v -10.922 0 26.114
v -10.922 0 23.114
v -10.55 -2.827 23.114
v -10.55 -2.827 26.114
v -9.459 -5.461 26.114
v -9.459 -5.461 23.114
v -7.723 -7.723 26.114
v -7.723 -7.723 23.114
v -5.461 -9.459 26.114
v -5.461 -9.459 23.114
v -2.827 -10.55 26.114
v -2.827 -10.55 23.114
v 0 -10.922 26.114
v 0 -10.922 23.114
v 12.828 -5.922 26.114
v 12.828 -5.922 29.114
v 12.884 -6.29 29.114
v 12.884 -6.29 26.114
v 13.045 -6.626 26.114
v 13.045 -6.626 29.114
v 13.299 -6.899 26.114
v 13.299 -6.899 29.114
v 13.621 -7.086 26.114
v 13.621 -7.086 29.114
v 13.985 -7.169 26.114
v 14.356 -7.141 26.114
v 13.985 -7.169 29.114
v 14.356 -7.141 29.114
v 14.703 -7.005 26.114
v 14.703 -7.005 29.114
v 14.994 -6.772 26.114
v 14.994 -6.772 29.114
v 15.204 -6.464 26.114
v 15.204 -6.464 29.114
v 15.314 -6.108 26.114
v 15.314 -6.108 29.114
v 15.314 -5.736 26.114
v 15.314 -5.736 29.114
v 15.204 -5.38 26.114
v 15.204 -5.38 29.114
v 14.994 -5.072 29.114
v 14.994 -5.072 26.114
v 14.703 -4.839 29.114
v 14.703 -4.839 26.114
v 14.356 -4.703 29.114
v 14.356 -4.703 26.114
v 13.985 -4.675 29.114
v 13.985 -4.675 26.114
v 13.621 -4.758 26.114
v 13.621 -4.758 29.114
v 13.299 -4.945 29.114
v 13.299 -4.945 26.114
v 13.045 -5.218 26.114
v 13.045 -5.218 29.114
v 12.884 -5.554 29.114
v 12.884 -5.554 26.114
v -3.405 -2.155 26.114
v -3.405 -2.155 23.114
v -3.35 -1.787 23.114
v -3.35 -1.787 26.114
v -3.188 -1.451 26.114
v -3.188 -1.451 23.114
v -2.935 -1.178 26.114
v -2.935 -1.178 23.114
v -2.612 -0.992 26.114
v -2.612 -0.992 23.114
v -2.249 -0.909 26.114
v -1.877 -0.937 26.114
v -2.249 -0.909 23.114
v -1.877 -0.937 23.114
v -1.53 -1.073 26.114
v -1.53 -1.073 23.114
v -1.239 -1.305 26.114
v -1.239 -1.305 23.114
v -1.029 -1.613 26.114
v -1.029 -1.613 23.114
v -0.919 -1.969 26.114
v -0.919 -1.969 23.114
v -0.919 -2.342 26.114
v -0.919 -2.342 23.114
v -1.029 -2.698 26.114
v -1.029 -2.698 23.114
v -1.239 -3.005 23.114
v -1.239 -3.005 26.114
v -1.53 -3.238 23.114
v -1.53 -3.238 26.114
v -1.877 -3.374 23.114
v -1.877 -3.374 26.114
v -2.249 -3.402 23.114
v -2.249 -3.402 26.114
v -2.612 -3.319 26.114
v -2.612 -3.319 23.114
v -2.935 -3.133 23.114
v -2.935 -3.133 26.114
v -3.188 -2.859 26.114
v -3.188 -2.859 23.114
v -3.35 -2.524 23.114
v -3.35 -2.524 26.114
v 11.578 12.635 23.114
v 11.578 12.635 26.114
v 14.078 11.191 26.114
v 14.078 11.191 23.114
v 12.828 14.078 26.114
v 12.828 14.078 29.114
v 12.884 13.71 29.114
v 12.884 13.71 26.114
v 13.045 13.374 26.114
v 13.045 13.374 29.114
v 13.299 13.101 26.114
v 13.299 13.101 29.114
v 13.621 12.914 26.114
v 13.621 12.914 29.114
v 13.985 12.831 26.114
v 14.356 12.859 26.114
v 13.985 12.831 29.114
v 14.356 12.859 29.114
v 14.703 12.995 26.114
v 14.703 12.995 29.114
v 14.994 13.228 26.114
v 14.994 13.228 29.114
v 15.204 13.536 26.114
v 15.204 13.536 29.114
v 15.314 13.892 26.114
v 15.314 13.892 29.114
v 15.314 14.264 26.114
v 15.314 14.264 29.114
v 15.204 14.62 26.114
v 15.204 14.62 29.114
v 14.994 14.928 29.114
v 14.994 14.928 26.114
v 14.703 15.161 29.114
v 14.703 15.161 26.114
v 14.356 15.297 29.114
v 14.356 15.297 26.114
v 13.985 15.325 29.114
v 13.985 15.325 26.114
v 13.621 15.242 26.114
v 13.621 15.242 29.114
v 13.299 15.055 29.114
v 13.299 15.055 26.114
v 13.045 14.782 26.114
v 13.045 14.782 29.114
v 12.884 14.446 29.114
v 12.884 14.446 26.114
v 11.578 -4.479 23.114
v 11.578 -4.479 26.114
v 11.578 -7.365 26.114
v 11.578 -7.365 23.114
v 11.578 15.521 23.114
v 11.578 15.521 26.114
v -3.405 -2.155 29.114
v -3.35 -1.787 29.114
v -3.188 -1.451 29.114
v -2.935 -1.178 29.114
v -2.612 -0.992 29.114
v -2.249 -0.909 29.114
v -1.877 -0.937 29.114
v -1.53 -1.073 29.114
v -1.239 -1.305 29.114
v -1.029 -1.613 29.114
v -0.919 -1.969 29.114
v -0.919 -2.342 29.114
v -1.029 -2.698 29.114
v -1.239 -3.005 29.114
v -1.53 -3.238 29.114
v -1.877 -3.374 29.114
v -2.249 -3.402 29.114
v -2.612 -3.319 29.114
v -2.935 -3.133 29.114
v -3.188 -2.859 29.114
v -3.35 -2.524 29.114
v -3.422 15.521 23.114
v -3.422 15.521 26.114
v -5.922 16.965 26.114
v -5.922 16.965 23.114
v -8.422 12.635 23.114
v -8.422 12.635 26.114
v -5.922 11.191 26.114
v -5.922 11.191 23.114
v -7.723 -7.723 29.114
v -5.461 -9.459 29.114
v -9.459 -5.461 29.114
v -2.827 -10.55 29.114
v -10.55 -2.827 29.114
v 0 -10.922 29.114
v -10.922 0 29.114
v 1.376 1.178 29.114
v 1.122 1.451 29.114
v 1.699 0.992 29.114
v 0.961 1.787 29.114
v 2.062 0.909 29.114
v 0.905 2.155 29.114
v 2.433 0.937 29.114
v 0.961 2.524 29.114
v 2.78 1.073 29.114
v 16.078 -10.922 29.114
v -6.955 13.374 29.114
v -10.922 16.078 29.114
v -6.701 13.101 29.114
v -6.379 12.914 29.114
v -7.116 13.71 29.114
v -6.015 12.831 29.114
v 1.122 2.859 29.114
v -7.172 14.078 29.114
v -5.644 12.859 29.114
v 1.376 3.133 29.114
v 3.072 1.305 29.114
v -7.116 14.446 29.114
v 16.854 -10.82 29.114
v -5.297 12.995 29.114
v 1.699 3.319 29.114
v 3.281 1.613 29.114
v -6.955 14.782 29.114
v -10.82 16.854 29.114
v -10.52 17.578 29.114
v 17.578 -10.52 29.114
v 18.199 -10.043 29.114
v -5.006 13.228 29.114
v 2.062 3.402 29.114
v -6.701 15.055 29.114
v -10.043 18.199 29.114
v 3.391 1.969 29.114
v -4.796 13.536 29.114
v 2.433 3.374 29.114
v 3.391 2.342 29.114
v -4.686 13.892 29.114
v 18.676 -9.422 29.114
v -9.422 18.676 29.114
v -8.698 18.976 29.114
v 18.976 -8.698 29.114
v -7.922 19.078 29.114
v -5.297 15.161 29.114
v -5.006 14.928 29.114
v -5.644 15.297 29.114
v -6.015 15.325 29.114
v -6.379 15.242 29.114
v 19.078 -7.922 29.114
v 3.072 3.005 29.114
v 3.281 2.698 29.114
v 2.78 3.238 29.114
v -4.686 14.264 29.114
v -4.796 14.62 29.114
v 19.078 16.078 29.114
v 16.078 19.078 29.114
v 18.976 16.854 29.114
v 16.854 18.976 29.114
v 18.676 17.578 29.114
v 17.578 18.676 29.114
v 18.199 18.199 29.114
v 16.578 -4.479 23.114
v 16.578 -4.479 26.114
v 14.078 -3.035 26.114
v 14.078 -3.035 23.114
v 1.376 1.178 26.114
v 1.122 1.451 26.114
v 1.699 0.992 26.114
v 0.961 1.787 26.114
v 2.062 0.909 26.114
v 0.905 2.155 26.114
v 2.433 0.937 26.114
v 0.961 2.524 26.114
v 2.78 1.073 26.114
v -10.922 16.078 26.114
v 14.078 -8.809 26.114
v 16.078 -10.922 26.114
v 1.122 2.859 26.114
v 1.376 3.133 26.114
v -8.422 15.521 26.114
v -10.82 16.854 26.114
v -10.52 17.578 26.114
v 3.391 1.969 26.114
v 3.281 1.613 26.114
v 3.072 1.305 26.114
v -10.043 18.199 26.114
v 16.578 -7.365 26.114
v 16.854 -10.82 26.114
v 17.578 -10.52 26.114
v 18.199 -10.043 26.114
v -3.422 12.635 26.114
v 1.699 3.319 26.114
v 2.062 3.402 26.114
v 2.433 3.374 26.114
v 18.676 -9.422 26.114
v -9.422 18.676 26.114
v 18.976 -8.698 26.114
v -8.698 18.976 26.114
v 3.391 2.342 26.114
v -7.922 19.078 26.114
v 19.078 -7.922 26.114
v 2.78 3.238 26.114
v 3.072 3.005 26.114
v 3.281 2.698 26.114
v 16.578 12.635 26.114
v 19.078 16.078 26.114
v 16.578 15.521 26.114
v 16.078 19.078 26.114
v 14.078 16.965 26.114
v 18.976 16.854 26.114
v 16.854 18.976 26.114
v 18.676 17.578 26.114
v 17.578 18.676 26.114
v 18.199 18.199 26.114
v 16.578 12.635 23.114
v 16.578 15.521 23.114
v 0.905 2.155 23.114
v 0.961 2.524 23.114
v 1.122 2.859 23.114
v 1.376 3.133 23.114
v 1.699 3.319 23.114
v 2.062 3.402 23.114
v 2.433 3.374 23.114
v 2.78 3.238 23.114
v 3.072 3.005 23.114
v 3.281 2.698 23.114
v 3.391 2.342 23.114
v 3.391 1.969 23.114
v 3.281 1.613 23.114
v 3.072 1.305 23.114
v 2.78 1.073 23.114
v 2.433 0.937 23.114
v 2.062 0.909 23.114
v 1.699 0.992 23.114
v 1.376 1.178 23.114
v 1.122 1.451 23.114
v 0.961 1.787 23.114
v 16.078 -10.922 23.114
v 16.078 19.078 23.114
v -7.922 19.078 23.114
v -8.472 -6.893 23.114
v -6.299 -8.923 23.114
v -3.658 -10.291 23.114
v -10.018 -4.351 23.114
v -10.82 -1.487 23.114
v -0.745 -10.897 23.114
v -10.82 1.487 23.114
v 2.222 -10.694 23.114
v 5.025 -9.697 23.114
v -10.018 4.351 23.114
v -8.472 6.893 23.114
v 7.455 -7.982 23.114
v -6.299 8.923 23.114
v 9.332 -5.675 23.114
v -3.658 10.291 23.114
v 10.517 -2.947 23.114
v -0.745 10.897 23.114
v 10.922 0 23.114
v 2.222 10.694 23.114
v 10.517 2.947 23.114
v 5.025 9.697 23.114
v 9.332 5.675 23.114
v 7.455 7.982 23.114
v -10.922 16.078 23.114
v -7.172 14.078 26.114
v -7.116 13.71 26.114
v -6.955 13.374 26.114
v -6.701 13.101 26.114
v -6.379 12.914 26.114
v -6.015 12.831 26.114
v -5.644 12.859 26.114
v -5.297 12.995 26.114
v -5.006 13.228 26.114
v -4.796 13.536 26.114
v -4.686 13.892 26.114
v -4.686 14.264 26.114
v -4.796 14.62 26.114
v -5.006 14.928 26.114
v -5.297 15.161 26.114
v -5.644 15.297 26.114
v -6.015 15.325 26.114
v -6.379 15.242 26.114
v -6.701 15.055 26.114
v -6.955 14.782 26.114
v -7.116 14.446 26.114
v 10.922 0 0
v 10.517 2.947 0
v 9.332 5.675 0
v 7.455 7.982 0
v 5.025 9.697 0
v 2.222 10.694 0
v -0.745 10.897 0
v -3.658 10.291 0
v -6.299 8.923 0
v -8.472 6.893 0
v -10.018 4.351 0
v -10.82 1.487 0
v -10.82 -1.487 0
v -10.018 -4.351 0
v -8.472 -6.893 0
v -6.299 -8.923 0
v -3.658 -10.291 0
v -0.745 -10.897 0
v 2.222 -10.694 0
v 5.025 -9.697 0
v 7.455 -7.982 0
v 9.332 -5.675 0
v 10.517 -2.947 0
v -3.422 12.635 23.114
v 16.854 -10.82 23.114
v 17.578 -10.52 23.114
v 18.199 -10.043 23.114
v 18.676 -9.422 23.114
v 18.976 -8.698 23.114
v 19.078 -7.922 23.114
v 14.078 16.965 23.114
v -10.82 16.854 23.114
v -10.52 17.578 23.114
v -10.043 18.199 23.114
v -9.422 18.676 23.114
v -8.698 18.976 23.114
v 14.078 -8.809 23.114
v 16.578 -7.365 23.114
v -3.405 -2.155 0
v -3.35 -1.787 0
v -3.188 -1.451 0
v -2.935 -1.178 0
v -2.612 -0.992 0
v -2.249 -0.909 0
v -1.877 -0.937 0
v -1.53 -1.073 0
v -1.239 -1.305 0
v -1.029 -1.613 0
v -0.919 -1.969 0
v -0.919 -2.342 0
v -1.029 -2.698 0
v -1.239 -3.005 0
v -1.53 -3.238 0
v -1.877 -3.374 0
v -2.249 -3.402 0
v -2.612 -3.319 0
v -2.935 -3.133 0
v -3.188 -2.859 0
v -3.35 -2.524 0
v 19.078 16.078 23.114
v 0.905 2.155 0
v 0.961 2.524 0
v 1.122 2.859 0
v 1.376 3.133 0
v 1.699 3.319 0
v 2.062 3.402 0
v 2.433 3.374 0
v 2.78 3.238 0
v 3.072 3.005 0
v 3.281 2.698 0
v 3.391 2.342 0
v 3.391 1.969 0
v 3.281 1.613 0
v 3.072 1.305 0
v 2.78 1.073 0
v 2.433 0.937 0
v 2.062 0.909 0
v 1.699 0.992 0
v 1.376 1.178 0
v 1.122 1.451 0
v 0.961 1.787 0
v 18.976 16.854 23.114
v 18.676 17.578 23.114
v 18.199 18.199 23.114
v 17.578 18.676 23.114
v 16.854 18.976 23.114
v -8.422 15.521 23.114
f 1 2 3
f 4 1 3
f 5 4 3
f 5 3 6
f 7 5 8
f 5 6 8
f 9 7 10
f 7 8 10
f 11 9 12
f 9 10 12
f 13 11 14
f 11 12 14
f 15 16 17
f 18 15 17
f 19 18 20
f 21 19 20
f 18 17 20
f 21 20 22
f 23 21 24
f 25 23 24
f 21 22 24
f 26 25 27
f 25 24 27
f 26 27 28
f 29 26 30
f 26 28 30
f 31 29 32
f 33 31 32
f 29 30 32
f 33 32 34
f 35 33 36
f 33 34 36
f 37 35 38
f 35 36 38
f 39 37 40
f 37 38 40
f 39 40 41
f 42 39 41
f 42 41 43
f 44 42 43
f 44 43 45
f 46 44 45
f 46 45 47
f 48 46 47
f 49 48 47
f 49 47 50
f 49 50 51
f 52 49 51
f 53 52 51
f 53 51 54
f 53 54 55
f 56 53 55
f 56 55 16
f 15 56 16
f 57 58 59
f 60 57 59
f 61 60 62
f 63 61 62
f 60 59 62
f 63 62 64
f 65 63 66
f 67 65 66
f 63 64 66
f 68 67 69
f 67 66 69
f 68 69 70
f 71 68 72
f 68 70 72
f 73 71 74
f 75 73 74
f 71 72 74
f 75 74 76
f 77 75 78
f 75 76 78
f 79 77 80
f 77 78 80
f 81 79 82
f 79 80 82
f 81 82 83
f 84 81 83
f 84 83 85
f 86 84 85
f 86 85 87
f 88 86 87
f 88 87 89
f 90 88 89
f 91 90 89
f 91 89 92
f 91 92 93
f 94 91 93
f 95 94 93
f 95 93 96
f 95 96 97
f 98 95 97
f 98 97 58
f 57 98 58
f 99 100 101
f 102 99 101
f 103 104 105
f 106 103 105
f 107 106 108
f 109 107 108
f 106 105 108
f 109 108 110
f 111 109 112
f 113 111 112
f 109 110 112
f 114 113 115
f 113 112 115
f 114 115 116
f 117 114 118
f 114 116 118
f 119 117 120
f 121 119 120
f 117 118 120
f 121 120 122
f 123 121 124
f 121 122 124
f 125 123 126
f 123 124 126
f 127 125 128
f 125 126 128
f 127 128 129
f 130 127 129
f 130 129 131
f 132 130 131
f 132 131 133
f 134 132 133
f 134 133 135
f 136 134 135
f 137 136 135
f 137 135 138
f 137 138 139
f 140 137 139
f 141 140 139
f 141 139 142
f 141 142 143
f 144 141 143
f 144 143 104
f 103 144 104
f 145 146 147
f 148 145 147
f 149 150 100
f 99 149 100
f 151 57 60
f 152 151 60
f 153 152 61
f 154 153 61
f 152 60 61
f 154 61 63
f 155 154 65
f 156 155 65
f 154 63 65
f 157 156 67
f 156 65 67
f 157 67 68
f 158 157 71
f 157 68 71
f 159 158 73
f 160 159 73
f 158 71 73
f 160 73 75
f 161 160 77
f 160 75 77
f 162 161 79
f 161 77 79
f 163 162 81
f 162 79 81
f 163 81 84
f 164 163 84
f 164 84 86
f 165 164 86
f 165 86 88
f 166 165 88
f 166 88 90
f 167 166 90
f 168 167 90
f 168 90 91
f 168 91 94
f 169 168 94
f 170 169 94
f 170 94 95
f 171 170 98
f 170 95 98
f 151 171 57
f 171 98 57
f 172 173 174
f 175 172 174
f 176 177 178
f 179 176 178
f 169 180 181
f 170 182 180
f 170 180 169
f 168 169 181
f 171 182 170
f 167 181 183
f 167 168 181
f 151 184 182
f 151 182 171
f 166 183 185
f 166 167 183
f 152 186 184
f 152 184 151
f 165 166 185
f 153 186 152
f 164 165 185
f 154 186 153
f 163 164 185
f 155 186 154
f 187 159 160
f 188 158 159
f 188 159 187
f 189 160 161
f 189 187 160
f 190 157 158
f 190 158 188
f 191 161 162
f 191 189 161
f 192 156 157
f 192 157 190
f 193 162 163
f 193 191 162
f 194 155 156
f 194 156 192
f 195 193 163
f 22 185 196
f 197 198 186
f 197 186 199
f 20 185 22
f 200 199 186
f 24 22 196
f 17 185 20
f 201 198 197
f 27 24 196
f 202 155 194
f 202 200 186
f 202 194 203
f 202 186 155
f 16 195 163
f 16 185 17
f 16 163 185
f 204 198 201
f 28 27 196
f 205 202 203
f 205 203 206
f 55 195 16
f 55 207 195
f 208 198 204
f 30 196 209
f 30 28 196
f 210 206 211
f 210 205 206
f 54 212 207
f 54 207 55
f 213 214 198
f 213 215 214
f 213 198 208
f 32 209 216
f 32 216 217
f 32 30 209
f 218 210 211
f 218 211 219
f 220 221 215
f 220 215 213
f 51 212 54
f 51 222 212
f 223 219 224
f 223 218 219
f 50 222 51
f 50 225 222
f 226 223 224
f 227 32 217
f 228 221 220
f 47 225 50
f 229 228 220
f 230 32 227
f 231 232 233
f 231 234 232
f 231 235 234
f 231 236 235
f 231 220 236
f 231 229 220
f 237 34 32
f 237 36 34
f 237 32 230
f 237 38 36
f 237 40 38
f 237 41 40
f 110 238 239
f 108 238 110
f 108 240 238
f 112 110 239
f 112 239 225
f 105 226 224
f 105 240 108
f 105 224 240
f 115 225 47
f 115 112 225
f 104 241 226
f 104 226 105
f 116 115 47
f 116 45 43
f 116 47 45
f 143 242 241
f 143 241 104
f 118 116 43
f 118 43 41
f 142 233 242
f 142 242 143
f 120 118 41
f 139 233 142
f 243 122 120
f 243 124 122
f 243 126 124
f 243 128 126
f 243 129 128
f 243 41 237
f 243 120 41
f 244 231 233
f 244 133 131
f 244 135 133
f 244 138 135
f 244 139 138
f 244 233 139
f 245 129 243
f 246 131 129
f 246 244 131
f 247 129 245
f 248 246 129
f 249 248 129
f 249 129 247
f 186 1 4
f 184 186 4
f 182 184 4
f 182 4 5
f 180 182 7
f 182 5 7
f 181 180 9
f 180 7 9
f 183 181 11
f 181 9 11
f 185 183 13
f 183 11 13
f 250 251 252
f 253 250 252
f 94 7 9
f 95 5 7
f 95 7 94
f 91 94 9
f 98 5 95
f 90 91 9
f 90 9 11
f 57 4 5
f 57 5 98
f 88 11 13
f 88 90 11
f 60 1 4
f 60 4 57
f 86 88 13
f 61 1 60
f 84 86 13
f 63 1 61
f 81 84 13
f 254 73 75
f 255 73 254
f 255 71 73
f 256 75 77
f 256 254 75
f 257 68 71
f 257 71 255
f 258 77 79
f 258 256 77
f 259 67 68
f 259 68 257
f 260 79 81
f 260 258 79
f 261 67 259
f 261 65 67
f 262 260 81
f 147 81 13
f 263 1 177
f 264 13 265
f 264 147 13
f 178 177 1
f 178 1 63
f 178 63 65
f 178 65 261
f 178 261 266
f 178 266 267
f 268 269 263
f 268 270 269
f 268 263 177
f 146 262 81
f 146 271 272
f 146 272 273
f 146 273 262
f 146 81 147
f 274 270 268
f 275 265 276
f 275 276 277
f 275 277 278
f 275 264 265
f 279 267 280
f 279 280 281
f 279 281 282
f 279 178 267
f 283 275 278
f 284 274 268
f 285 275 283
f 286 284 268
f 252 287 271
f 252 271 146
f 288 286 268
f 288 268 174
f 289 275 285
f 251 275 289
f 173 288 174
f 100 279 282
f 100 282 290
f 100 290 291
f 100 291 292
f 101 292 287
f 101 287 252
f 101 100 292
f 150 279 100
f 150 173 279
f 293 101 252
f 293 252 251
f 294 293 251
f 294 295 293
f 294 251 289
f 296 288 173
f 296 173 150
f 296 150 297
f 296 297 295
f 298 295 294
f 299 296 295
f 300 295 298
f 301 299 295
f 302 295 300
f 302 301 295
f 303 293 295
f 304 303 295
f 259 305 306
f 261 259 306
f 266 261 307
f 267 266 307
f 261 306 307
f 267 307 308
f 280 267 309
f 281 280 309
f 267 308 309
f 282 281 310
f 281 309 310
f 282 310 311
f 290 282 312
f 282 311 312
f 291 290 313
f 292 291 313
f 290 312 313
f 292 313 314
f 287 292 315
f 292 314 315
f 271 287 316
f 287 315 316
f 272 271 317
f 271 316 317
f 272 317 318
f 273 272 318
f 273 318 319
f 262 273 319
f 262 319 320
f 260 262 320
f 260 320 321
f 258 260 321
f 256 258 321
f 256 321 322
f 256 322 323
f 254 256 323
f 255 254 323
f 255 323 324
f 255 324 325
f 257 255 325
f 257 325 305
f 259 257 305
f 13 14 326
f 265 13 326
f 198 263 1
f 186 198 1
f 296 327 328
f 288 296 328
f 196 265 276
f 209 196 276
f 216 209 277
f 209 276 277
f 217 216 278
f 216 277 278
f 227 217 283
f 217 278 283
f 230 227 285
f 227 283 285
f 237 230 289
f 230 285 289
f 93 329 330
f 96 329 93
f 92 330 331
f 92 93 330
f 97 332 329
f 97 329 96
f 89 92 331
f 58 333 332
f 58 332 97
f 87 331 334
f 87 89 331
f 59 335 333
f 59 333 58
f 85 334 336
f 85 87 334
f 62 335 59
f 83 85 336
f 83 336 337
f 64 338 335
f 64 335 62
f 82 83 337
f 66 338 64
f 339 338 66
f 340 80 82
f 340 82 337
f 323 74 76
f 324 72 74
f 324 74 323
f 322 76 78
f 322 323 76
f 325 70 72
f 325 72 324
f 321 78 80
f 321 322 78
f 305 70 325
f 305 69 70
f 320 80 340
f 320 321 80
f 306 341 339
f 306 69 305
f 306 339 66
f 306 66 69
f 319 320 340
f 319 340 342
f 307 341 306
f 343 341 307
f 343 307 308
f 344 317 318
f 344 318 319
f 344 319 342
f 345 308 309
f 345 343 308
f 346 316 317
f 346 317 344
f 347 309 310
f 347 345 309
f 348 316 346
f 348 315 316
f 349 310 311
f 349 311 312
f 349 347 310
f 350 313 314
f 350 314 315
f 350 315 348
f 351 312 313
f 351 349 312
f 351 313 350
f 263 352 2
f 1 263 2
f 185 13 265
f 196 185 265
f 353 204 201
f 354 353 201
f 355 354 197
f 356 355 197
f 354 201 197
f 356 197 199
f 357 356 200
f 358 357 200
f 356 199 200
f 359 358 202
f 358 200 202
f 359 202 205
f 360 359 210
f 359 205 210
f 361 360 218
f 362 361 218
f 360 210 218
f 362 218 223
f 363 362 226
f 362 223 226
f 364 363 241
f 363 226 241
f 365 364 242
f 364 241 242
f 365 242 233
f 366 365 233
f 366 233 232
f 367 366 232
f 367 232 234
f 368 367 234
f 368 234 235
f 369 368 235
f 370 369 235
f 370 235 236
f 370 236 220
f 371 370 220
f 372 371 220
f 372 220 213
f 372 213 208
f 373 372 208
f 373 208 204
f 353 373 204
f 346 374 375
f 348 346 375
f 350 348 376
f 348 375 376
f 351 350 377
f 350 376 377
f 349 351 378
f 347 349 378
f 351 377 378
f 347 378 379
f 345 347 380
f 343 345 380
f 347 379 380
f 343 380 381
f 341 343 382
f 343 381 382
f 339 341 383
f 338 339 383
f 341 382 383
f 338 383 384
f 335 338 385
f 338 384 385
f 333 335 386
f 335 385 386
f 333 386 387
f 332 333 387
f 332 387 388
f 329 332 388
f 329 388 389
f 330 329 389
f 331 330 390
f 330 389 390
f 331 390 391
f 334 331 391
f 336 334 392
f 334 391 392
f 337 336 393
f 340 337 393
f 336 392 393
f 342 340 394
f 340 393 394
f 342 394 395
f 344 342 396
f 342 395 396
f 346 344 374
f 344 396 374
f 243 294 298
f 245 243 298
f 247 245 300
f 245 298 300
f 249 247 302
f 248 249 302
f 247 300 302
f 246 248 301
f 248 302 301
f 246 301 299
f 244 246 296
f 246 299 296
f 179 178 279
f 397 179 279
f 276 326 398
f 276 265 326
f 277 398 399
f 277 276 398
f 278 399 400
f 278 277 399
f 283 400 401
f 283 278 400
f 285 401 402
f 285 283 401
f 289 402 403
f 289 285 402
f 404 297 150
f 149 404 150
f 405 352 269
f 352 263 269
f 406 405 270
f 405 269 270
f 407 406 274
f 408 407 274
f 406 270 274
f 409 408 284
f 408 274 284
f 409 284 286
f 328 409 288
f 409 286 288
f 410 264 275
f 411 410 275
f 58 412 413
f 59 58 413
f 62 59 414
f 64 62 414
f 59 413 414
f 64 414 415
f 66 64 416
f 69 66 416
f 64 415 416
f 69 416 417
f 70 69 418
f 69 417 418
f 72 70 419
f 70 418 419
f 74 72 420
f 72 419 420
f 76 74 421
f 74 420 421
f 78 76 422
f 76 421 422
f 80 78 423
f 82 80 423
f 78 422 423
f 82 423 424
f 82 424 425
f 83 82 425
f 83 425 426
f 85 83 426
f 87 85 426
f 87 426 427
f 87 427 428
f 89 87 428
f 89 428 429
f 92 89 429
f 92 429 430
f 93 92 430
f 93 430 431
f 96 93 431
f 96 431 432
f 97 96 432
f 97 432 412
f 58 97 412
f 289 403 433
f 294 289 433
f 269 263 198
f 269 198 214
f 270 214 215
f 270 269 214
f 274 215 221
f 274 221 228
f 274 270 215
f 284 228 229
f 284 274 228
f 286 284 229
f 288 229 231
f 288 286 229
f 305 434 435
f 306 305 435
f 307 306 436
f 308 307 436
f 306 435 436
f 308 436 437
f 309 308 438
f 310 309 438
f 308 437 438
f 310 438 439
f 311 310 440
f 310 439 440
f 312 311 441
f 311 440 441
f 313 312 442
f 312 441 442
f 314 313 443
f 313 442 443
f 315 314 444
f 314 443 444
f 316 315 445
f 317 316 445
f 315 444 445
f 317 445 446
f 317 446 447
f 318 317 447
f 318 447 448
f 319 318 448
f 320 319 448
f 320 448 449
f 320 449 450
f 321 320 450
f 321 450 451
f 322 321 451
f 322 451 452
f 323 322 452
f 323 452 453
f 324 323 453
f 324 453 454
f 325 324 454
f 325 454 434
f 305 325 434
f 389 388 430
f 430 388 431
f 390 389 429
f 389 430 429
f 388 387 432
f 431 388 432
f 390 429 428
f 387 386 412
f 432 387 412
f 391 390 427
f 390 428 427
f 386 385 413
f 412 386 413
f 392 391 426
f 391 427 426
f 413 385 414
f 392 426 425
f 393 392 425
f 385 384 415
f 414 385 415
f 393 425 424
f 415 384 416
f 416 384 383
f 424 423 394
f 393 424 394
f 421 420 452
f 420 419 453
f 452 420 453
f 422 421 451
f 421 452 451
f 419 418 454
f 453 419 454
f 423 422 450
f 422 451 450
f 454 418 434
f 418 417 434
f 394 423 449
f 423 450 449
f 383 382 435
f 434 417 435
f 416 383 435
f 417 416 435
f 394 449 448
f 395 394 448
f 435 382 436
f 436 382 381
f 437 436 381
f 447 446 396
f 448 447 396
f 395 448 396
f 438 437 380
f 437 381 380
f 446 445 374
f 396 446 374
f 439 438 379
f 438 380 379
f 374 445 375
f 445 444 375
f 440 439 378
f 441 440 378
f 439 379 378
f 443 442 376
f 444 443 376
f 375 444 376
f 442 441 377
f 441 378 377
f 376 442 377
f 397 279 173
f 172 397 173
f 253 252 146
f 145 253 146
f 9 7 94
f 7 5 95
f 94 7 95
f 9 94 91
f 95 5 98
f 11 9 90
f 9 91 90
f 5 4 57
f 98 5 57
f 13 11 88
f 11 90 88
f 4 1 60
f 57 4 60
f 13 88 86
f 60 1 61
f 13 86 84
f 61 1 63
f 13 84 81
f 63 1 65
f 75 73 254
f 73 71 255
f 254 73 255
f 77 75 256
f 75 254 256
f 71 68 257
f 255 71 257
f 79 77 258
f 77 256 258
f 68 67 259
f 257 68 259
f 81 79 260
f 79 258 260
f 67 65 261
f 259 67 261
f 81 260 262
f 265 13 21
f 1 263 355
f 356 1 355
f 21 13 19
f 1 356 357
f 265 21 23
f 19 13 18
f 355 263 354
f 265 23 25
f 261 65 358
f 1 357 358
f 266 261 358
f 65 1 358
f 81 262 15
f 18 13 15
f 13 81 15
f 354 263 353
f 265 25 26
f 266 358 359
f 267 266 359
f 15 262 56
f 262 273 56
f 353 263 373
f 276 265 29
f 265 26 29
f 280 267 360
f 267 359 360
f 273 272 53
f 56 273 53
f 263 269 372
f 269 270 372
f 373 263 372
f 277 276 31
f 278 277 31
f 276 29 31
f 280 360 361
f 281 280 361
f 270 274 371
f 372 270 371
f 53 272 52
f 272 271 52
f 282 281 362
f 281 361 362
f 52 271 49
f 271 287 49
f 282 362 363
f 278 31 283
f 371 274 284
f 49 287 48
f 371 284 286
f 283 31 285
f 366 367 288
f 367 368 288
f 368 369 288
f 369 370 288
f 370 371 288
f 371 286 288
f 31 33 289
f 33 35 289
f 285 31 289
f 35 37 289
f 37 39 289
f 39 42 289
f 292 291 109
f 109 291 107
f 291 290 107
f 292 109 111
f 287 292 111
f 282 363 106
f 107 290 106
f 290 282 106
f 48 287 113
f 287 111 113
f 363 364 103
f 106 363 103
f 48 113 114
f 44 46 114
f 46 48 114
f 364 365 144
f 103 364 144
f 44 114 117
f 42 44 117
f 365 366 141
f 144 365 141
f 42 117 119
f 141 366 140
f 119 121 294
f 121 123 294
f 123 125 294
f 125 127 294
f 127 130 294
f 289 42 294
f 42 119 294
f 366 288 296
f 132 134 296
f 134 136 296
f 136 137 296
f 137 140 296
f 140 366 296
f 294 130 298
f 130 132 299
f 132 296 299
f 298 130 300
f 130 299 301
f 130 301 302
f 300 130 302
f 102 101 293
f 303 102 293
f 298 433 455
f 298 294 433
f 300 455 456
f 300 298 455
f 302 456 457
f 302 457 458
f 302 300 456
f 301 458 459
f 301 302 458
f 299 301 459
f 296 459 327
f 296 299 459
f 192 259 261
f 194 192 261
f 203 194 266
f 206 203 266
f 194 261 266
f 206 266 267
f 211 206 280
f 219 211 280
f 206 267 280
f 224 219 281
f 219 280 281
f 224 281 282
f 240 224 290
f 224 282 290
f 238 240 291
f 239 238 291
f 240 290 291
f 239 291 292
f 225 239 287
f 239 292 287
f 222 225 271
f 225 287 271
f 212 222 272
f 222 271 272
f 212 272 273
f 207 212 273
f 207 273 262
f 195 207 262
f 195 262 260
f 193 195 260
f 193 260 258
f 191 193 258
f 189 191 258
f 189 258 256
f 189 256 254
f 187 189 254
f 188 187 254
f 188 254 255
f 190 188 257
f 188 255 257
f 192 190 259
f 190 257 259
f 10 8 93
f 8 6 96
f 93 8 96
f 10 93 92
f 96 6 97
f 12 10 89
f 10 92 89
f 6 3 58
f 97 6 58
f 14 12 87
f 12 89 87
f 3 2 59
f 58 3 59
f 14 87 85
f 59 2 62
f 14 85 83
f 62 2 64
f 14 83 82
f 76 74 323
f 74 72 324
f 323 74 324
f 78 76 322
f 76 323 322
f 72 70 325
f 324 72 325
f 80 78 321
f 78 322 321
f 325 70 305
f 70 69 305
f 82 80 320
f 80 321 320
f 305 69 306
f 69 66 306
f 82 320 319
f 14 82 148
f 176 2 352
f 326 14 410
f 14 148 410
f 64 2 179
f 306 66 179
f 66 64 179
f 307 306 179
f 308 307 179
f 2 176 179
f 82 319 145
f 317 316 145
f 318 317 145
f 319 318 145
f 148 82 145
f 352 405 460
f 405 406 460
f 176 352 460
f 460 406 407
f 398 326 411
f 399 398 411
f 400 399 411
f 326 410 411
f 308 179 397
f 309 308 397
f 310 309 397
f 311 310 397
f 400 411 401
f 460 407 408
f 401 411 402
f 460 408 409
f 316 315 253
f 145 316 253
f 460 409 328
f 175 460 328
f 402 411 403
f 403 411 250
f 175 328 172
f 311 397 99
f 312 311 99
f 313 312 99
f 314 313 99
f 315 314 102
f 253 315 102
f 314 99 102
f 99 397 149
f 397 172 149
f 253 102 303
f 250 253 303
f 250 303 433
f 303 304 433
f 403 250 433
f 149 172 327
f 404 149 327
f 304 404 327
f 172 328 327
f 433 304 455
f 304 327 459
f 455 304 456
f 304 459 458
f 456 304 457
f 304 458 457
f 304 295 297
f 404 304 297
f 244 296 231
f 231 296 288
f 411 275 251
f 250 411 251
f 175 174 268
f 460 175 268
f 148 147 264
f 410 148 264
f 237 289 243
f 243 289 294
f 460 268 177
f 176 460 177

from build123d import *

# Parameters (mm, degrees)
F0_R     = 10.922
F1_DEPTH = 23.114
F3_DEPTH = 3
F4_R     = 3
F6_D     = 2.5
F6_2_D   = 2.5
F7_DEPTH = 3
F9_DEPTH = 26.115
F10_D    = 2.5


with BuildPart() as f1:
    # F0 (on Top) → F1 (new body)
    with BuildSketch(Plane.XY):
        Circle(F0_R)
    extrude(amount=F1_DEPTH)

    # F6 (through all)
    with Locations(Plane.XY.offset(26.114)):
        with Locations((-2.1552614691, -2.1552614691), (2.1552614691, 2.1552614691)):
            Hole(F6_D / 2)


with BuildPart() as f3:
    # F2 (on face) → F3 (new body)
    with BuildSketch(Plane.XY.offset(23.114)):
        with BuildLine():
            Line((-10.922, 19.078), (-10.922, 0))
            ThreePointArc((-10.922, 0), (-7.7230202641, -7.7230202641), (0, -10.922))
            Line((0, -10.922), (19.078, -10.922))
            Line((19.078, -10.922), (19.078, 19.078))
            Line((19.078, 19.078), (-10.922, 19.078))
        make_face()
    extrude(amount=F3_DEPTH)

    # F4
    f4_edges = [f3.edges().sort_by_distance(p)[0] for p in [
        (19.078, -10.922, 24.614),
        (19.078, 19.078, 24.614),
        (-10.922, 19.078, 24.614),
    ]]
    fillet(f4_edges, radius=F4_R)

    # F6#2 (through all)
    with Locations(Plane.XY.offset(26.114)):
        with Locations((-2.1552614691, -2.1552614691), (2.1552614691, 2.1552614691)):
            Hole(F6_2_D / 2)


with BuildPart() as f7:
    # F7 (new): a face of the model
    f7_faces = [f3.part.faces().sort_by_distance(p)[0] for p in [
        (4.4668066755, 4.4668066755, 26.114),
    ]]
    extrude(f7_faces, amount=F7_DEPTH)

    # F10 (through all)
    with Locations(Plane(origin=(0, 0, 26.114), x_dir=(1, 0, 0), z_dir=(0, 0, -1))):
        with Locations((-5.922, -14.078), (14.078, -14.078), (14.078, 5.922)):
            Hole(F10_D / 2)


with BuildPart() as f3_1:
    add(f3.part)

    # F8 (on face) → F9 (cut, through all)
    with BuildSketch(Plane.XY.offset(26.114)):
        Polygon((-3.422, 12.634624327), (-3.422, 15.521375673), (-5.922, 16.9647513459), (-8.422, 15.521375673), (-8.422, 12.634624327), (-5.922, 11.1912486541), align=None)
        Polygon((14.078, 16.9647513459), (11.578, 15.521375673), (11.578, 12.634624327), (14.078, 11.1912486541), (16.578, 12.634624327), (16.578, 15.521375673), align=None)
        Polygon((11.578, -4.478624327), (11.578, -7.365375673), (14.078, -8.8087513459), (16.578, -7.365375673), (16.578, -4.478624327), (14.078, -3.0352486541), align=None)
    extrude(amount=-F9_DEPTH, mode=Mode.SUBTRACT)


solid = Compound([f1.part, f7.part, f3_1.part])
